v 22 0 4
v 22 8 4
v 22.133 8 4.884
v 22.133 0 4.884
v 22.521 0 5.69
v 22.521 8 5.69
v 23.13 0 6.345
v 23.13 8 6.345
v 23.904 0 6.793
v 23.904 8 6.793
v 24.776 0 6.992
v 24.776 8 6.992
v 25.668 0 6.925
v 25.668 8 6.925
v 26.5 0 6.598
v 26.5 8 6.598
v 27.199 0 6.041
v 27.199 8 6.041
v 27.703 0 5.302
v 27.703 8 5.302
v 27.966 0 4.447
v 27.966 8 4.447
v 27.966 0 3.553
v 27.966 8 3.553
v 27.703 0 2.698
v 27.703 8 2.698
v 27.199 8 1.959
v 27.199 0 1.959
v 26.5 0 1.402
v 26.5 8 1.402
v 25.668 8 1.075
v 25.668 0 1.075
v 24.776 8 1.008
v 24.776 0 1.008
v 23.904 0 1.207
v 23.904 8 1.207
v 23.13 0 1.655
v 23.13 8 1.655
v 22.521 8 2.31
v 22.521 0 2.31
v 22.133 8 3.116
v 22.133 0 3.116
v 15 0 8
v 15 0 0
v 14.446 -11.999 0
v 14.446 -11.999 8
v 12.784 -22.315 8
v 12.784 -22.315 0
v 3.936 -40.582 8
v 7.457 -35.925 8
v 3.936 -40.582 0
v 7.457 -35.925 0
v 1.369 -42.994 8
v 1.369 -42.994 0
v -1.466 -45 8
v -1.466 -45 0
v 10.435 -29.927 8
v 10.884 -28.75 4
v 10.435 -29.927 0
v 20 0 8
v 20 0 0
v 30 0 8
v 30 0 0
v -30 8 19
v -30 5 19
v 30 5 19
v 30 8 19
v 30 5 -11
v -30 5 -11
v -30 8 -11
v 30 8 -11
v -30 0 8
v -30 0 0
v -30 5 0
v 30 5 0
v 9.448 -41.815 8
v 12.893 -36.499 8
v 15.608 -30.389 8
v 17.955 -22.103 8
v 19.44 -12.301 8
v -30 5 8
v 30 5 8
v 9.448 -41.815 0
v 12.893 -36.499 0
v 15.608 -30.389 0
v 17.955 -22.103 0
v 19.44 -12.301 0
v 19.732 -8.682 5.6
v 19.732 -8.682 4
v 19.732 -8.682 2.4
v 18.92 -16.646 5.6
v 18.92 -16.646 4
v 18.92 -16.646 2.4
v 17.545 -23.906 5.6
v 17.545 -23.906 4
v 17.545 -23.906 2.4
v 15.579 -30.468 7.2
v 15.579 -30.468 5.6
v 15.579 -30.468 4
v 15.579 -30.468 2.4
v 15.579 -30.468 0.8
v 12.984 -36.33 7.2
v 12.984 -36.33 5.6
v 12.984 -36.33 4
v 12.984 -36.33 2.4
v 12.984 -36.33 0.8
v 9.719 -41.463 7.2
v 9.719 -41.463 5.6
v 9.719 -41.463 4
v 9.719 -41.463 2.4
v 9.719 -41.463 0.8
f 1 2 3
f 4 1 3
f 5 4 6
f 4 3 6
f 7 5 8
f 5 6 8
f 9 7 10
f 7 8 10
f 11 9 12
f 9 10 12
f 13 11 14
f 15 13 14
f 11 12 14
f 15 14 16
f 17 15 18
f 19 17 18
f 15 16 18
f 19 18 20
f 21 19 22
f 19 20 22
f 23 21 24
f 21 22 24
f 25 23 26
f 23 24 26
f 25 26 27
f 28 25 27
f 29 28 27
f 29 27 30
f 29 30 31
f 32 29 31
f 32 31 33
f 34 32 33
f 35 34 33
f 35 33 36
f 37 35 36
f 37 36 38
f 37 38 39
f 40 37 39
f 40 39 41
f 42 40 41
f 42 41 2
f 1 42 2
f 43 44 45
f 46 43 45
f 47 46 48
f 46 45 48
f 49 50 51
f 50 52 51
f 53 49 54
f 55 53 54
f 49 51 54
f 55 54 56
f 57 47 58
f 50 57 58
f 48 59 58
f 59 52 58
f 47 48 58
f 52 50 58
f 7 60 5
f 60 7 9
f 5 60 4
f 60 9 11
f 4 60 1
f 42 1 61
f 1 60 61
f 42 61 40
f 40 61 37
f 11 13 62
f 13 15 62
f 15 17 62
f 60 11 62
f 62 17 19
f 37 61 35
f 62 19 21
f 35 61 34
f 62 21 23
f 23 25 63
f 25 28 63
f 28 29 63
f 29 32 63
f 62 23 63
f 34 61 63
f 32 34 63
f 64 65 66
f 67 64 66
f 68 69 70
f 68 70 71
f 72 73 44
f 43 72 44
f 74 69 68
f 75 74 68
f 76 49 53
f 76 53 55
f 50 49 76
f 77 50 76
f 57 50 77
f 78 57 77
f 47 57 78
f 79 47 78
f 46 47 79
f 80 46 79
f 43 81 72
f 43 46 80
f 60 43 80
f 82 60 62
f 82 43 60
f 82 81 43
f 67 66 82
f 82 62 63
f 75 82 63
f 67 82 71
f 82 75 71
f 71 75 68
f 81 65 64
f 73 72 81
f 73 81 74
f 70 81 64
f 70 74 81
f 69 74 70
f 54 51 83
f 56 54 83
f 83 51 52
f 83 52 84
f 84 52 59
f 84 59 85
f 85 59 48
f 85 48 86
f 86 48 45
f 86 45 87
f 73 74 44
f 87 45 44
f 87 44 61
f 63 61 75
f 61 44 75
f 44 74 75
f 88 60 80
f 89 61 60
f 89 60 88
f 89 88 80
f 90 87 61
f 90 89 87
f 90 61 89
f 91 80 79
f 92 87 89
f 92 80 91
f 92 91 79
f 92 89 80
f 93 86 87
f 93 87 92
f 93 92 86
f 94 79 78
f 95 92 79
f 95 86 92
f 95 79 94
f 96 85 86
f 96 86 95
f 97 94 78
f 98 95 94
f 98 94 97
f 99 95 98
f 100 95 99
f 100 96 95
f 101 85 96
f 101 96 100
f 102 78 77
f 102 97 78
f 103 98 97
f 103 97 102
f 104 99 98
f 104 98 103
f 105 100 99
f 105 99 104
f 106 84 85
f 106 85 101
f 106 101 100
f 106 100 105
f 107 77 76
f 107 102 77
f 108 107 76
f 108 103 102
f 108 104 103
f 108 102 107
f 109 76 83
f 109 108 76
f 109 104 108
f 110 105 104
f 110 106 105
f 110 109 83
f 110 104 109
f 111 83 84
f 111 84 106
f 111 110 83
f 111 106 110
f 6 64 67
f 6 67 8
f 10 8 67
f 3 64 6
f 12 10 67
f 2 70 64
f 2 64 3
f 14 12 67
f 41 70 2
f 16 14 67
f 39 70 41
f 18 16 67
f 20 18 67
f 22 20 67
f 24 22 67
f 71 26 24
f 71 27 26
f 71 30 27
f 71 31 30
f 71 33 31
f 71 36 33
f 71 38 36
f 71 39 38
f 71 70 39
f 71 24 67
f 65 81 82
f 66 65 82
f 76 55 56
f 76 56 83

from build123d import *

# Parameters (mm, degrees)
BOSS_EXTRUDE1_DEPTH = 8
SKETCH4_W           = 60
SKETCH4_H           = 30
BOSS_EXTRUDE2_DEPTH = 3
SKETCH5_R           = 3
CUT_EXTRUDE1_DEPTH  = 68.388900825
CUT_EXTRUDE3_DEPTH  = 61.736204501


# Read off the part's stored shape, not the designer's step: Boss-Extrude1
with BuildPart() as part:
    # Boss-Extrude1 outline → Boss-Extrude1 (new body)
    with BuildSketch(Plane.XY):
        with BuildLine():
            Line((-30, 0), (15, 0))
            add(Edge.make_bspline(
                [(15, 0), (15, -35), (-1.465594932, -45)],
                knots=[0, 0, 0, 1, 1, 1], degree=2))
            Line((-1.465594932, -45), (1.12987064, -49.273588476))
            add(Edge.make_bspline(
                [(20, 0), (20, -0.746108231), (19.988920633, -2.249243802), (19.922237871, -5.16766696), (19.754979798, -8.712103145), (19.418395555, -12.782160754), (18.785639236, -17.973362747), (17.643635897, -24.021456658), (15.683824621, -30.584336804), (13.095918314, -36.449845939), (8.74916419, -43.310162254), (4.437502248, -47.26477457), (1.12987064, -49.273588476)],
                knots=[0, 0, 0, 0, 0.03125, 0.0625, 0.125, 0.1875, 0.25, 0.375, 0.5, 0.625, 0.75, 1, 1, 1, 1], degree=3))
            Line((20, 0), (30, 0))
            Line((30, 0), (30, 5))
            Line((30, 5), (-30, 5))
            Line((-30, 5), (-30, 0))
        make_face()
    extrude(amount=BOSS_EXTRUDE1_DEPTH)

    # Sketch4 → Boss-Extrude2 (add)
    with BuildSketch(Plane(origin=(0, 5, 0), x_dir=(1, 0, 0), z_dir=(0, 1, 0))):
        with Locations((0, -4)):
            Rectangle(SKETCH4_W, SKETCH4_H)
    extrude(amount=BOSS_EXTRUDE2_DEPTH)

    # Sketch5 → Cut-Extrude1 (cut, through all)
    with BuildSketch(Plane(origin=(0, 8, 0), x_dir=(1, 0, 0), z_dir=(0, 1, 0))):
        with Locations(Location((25, -4, 0), (0, 0, 180))):
            Circle(SKETCH5_R)
    extrude(amount=-CUT_EXTRUDE1_DEPTH, mode=Mode.SUBTRACT)

    # Sketch7 → Cut-Extrude3 (cut, through all)
    with BuildSketch(Plane.XY.offset(8)):
        Polygon((-1.465594932, -45), (9.447885747, -41.814579425), (11.582932476, -49.129403534), (0.669451797, -52.314824109), align=None)
    extrude(amount=-CUT_EXTRUDE3_DEPTH, mode=Mode.SUBTRACT)


solid = part.part
